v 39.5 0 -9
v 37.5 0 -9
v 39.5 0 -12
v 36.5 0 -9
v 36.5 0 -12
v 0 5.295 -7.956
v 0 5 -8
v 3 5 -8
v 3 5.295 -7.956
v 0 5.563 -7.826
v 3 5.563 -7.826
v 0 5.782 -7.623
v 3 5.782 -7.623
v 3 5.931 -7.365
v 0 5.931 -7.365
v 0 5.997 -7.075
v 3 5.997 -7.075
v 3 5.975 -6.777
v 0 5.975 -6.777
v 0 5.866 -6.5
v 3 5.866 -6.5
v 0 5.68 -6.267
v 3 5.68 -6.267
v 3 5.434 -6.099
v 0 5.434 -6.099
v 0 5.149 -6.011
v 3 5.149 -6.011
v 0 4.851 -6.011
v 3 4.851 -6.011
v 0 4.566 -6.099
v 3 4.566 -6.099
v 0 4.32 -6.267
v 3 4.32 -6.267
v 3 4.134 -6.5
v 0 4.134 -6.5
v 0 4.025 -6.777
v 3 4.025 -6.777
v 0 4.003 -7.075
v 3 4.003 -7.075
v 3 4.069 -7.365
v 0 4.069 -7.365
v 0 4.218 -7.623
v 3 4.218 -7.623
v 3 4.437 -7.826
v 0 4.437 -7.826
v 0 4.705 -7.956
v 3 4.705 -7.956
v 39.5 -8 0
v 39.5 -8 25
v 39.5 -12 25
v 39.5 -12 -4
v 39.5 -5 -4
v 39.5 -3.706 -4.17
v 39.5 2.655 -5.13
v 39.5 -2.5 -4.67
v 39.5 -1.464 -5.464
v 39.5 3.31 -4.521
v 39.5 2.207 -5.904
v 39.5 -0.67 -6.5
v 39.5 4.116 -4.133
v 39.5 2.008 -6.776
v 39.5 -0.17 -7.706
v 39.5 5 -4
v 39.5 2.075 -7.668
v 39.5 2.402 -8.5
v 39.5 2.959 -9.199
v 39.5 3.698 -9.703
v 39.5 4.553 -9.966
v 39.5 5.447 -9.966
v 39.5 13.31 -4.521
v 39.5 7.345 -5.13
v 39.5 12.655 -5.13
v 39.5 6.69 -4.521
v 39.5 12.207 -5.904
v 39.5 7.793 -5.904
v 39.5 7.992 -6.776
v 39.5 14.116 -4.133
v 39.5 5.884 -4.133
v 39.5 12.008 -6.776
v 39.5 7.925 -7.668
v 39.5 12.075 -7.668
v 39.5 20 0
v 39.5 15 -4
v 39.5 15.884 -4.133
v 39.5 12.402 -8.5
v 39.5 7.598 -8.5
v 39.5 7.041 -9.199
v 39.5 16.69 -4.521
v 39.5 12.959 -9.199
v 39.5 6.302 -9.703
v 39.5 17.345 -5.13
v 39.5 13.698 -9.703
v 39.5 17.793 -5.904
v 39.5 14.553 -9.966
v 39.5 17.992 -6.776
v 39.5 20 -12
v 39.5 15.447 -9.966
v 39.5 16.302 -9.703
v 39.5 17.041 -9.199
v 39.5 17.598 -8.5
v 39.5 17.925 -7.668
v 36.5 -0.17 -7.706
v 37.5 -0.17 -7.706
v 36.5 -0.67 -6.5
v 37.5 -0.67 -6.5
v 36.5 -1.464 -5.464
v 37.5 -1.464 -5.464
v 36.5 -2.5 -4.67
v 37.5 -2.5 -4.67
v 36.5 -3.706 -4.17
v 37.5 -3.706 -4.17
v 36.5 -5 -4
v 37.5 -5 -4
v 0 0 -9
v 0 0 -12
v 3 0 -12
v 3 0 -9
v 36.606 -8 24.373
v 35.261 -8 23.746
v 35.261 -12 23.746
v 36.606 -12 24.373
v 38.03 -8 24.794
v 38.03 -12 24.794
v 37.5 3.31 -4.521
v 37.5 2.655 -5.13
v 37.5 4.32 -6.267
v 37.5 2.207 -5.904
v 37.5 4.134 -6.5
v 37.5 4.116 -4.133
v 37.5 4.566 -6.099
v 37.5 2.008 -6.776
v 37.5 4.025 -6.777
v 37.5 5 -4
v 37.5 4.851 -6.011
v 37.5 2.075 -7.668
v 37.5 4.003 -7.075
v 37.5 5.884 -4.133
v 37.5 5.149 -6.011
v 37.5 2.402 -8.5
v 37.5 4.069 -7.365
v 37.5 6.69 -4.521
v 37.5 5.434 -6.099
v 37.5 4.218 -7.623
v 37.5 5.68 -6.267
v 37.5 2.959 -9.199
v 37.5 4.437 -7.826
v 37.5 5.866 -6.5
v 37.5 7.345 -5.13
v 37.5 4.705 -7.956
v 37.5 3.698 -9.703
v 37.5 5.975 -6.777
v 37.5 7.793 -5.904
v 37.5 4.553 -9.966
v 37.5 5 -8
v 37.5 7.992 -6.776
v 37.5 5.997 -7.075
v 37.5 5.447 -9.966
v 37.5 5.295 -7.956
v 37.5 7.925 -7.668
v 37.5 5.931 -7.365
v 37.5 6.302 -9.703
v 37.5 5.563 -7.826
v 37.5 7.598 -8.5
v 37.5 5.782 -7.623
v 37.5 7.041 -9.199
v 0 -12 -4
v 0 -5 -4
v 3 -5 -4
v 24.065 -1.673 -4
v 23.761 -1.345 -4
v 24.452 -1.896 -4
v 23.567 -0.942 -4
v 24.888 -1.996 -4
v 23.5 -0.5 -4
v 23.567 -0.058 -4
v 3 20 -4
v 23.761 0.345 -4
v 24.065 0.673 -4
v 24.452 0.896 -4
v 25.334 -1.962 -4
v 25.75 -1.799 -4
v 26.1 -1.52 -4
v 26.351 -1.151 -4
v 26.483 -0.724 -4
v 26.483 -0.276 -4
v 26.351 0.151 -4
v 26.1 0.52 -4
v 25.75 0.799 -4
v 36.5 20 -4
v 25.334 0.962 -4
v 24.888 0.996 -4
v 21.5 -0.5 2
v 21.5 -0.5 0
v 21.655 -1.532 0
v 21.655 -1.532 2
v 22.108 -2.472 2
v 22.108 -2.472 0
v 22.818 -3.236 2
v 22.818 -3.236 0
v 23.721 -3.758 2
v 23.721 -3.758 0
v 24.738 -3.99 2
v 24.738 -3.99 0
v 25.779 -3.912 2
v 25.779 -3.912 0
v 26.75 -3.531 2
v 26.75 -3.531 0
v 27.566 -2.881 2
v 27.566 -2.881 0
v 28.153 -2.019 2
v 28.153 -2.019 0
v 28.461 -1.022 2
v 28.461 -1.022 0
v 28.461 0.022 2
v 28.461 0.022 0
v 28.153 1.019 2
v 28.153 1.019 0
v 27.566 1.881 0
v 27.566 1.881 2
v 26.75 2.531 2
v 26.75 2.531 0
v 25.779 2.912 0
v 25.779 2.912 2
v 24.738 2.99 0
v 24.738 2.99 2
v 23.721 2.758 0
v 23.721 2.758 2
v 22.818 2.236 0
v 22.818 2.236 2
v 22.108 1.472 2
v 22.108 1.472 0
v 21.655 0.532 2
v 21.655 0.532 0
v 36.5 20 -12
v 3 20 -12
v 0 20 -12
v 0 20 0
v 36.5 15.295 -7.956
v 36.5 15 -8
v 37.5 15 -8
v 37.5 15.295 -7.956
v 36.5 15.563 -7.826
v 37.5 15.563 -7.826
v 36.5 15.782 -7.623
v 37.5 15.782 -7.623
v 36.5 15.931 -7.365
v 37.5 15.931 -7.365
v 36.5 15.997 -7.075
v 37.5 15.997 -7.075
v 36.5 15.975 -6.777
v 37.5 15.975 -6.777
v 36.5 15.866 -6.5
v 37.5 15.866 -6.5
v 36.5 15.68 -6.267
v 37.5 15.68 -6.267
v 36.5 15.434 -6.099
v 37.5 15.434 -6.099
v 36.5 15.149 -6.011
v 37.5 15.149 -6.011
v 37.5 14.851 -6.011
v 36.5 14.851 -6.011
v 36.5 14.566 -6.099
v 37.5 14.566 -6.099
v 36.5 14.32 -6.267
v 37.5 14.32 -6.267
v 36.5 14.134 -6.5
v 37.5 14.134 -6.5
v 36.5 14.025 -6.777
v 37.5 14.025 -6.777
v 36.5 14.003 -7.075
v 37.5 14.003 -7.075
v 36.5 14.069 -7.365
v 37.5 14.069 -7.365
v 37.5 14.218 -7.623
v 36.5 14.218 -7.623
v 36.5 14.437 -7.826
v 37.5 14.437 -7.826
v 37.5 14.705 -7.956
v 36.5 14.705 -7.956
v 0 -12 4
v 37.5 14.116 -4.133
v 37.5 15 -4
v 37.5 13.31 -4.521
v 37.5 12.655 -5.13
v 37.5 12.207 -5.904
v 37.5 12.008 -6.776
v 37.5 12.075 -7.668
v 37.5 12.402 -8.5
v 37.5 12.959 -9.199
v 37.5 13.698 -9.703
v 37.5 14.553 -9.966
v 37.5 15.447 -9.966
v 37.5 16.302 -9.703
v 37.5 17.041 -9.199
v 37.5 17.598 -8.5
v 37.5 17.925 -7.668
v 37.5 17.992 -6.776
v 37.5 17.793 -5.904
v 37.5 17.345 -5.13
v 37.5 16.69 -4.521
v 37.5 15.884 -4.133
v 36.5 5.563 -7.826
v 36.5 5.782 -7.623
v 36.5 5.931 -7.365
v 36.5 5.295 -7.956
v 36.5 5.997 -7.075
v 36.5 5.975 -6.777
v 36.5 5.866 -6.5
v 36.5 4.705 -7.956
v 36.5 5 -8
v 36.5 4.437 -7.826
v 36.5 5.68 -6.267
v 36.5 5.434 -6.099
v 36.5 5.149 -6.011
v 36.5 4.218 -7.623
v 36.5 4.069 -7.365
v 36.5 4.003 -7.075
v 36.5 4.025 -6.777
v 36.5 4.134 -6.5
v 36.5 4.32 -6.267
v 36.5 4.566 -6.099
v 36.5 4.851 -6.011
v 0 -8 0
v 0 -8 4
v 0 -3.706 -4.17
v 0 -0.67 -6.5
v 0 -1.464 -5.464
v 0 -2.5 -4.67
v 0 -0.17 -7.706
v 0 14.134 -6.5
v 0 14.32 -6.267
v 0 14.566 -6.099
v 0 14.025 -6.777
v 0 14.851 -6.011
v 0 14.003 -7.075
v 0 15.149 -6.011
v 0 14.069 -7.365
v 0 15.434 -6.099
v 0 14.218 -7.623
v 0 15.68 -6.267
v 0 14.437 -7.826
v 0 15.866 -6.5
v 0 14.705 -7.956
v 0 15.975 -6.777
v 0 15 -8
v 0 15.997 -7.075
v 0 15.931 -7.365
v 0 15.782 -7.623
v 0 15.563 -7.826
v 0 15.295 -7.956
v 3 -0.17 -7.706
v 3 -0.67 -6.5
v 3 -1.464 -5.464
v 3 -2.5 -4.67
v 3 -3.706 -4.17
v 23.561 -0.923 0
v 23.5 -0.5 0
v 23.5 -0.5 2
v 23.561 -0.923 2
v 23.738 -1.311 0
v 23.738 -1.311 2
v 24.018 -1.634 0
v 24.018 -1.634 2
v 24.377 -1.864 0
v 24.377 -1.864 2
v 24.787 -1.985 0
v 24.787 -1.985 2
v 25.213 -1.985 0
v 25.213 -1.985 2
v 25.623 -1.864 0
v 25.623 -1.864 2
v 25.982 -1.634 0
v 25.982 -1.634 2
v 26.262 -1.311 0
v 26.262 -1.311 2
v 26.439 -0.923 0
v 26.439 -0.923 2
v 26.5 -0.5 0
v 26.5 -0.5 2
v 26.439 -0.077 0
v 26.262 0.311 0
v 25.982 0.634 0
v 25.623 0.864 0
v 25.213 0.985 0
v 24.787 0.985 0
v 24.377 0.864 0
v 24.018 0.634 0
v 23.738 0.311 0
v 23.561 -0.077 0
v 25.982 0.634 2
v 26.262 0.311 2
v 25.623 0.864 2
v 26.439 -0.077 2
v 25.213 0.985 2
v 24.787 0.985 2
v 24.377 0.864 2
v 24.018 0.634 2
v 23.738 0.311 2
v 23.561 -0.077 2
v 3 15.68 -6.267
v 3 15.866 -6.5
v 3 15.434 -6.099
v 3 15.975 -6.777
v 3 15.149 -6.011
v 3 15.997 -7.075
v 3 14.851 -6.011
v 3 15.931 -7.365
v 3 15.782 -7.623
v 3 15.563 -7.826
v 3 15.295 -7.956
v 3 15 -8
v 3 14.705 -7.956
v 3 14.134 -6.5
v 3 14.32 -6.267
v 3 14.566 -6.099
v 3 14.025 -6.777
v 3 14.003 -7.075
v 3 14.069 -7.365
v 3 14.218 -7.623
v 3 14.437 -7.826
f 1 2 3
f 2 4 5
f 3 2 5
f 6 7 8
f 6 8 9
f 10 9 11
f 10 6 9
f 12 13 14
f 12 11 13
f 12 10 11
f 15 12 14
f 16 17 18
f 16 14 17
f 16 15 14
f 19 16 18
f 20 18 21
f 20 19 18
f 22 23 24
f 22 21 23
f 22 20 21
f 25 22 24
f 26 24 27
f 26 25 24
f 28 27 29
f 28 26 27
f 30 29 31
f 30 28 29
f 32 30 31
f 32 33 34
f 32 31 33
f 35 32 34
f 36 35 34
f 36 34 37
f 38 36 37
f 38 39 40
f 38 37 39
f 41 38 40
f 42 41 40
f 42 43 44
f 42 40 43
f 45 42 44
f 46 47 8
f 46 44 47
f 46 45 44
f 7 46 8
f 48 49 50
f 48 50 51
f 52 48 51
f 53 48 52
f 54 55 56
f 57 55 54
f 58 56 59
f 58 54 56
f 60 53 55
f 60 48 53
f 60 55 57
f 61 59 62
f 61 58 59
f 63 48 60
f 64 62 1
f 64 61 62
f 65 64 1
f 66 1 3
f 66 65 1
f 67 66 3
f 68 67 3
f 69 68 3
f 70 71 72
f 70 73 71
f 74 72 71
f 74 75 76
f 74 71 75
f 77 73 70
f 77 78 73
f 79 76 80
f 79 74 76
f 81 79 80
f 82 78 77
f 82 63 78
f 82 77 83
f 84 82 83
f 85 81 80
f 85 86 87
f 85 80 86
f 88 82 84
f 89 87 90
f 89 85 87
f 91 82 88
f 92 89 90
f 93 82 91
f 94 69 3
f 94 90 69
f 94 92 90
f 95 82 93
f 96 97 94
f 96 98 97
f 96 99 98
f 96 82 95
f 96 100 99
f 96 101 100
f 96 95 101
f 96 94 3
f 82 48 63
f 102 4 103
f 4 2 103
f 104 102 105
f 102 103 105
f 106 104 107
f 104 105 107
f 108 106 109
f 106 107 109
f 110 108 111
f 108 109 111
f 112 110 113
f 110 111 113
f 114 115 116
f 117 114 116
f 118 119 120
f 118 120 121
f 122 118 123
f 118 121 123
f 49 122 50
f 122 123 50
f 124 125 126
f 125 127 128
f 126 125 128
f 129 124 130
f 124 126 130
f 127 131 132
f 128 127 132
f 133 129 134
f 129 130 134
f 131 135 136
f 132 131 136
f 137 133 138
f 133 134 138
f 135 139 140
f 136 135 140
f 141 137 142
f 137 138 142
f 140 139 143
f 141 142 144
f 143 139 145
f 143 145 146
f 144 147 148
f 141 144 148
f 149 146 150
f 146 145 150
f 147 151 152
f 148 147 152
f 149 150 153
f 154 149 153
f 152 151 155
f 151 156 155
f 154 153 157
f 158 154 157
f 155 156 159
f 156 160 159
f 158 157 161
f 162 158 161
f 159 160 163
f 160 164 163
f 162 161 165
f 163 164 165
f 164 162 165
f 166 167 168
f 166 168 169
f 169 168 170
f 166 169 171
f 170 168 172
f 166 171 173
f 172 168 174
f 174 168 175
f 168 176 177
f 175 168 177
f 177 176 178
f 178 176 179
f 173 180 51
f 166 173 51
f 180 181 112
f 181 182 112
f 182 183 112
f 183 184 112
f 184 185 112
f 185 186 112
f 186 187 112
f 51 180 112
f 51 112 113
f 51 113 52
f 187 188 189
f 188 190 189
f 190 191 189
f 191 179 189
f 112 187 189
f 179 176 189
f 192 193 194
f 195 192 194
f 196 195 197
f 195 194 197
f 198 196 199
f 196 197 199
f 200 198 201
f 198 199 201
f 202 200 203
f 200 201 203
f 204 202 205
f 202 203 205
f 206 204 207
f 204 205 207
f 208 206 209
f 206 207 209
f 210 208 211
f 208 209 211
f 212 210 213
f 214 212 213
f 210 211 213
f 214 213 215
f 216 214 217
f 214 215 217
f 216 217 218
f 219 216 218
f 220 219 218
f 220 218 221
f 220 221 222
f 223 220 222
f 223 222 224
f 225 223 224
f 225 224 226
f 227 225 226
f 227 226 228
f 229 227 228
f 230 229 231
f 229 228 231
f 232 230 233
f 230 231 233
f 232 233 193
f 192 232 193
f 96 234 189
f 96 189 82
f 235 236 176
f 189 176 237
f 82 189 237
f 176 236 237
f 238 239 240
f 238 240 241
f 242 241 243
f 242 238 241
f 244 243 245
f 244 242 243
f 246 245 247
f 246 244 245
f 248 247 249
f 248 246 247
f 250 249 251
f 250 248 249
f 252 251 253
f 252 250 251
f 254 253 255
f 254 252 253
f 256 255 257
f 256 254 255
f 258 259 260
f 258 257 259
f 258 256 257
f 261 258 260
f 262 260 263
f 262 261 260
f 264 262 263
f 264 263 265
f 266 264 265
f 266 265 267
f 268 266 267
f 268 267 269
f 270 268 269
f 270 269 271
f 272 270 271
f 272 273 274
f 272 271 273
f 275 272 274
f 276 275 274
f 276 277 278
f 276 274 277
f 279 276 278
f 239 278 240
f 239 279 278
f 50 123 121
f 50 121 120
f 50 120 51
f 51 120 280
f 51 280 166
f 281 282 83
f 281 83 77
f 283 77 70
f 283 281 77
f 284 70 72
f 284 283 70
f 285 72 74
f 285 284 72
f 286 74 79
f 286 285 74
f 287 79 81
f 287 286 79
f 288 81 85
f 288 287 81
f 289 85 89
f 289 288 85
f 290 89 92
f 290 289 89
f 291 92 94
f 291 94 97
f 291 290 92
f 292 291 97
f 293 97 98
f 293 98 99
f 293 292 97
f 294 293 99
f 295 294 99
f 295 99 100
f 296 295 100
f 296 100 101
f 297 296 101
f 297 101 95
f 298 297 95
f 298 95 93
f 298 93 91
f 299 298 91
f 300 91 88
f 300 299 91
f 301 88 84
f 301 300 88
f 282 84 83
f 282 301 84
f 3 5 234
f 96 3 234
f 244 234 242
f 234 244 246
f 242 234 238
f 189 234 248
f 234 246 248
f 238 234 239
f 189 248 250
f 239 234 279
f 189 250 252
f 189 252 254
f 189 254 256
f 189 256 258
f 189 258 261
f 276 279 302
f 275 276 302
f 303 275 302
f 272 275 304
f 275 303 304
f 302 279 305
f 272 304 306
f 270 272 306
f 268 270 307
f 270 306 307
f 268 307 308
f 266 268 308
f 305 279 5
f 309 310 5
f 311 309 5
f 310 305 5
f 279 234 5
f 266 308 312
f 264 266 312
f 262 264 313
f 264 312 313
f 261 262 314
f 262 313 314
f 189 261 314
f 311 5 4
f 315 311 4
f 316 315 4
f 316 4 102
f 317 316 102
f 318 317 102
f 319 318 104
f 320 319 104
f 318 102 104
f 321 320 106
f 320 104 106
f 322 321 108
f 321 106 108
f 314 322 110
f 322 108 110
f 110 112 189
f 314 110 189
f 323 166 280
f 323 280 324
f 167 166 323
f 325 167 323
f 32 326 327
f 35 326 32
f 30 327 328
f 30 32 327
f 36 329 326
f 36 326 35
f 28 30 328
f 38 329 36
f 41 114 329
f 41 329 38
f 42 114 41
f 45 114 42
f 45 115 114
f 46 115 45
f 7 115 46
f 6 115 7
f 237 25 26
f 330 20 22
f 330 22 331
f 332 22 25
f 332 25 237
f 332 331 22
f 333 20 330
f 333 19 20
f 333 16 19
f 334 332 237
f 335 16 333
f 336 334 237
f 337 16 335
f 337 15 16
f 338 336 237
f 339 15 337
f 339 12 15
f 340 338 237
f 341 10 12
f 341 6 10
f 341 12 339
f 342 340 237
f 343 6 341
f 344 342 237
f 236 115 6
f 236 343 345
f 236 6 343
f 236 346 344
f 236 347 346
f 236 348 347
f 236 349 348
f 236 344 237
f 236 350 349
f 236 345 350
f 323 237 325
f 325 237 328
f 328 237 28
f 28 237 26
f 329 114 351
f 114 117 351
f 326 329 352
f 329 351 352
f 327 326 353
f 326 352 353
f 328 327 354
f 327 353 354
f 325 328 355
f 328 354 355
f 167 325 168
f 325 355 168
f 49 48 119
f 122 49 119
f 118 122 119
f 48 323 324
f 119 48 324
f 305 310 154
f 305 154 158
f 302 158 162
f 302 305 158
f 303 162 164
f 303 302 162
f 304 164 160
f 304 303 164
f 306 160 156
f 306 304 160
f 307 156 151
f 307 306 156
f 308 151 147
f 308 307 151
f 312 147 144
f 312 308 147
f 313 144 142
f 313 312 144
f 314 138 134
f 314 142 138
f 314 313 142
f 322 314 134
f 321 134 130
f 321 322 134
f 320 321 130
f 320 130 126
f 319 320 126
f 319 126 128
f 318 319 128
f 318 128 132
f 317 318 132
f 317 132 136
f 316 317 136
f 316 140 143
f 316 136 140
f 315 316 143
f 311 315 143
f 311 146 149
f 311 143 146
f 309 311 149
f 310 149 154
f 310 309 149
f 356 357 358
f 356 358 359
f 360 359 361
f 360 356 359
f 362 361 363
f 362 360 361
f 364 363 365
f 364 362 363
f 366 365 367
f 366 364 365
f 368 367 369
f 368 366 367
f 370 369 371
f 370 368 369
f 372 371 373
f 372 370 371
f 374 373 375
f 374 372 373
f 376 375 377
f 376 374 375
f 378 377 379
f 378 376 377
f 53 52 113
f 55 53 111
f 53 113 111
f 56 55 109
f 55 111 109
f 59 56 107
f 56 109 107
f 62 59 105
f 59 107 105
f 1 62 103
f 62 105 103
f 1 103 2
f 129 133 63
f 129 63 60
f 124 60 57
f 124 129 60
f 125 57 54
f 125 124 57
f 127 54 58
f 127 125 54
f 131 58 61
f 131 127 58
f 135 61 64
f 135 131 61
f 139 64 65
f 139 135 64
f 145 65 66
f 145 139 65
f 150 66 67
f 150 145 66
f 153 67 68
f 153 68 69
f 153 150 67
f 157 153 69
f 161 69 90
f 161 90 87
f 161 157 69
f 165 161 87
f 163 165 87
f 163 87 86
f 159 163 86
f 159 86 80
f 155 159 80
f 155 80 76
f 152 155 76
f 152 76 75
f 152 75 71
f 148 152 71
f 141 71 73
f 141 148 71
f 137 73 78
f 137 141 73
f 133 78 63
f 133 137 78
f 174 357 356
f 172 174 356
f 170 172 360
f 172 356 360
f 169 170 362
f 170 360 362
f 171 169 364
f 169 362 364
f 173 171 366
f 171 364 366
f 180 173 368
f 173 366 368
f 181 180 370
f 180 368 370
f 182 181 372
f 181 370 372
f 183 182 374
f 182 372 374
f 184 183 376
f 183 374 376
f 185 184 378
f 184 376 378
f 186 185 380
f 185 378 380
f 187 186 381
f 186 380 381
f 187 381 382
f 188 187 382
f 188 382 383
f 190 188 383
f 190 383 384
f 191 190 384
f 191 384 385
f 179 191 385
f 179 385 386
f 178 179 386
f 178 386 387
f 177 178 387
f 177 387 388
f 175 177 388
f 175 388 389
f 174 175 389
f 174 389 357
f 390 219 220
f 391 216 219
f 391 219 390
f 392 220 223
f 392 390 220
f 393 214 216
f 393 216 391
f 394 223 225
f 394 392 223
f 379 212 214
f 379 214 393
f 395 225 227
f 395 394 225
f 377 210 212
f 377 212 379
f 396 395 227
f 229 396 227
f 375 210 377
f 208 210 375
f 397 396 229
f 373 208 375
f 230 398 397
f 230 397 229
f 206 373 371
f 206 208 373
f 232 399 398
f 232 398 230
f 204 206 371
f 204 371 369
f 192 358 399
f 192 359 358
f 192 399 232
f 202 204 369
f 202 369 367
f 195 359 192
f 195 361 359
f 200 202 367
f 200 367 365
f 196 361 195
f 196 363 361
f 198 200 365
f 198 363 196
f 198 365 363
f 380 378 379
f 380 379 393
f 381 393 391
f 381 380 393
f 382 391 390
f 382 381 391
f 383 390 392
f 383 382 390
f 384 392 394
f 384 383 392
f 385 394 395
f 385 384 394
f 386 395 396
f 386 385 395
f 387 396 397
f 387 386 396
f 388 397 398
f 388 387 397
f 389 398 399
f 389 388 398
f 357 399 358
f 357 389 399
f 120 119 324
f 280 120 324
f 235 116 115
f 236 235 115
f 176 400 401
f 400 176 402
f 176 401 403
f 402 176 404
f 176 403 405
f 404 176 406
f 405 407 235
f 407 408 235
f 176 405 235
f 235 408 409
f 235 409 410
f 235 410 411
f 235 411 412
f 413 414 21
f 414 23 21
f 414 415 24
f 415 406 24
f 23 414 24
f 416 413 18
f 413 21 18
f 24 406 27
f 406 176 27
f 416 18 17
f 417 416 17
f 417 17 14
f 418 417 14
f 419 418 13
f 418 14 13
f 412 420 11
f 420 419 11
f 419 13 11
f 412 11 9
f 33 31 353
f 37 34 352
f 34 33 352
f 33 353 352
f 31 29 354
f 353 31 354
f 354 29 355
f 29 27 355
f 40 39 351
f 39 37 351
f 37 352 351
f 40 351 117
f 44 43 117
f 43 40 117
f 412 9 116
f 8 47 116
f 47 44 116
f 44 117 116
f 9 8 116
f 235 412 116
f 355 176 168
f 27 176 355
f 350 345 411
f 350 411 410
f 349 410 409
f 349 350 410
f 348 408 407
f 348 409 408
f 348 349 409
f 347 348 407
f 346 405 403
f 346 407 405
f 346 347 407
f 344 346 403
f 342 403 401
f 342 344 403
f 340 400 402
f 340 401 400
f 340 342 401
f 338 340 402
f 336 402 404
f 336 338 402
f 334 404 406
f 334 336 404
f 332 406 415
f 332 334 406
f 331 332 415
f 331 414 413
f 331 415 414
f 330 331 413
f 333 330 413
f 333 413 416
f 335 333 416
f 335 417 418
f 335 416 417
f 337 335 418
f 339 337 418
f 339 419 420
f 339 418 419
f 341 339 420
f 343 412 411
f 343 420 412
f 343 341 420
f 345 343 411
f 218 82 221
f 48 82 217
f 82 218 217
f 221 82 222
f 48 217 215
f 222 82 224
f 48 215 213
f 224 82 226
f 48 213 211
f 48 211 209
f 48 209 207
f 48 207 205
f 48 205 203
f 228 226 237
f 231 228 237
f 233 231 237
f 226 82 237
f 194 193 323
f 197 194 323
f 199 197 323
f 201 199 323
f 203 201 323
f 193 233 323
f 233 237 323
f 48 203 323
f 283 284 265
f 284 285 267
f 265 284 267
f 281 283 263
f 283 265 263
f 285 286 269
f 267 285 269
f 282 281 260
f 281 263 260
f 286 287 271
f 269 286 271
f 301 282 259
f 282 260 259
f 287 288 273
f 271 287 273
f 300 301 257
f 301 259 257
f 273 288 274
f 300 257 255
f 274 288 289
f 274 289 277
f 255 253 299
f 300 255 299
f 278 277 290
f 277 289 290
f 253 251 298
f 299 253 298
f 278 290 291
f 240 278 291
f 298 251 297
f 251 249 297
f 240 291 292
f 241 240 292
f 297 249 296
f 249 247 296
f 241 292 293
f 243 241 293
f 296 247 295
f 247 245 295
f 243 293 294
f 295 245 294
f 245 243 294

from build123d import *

# Parameters (mm, degrees)
BOSS_EXTRUDE1_DEPTH     = 20
SKETCH2_W               = 37.5
SKETCH2_H               = 4
BOSS_EXTRUDE2_DEPTH     = 12
FILLET1_R               = 5
SKETCH3_W               = 37.5
SKETCH3_H               = 4
BOSS_EXTRUDE3_DEPTH     = 25
SKETCH4_R               = 3.5
SKETCH4_R_2             = 1.5
BOSS_EXTRUDE4_DEPTH     = 2
SKETCH5_R               = 1.5
CUT_EXTRUDE1_DEPTH      = 49.324424466
CUT_EXTRUDE2_DEPTH      = 10
CUT_EXTRUDE3_DEPTH      = 50.307707308
CUT_EXTRUDE3_DEPTH_BACK = 50.307707308
SKETCH8_R               = 1
SKETCH9_R               = 3
BOSS_EXTRUDE5_DEPTH     = 2
FILLET2_R               = 10


with BuildPart() as part:
    # Sketch1 → Boss-Extrude1 (new body)
    with BuildSketch(Plane(origin=(0, 0, 0), x_dir=(1, 0, 0), z_dir=(0, 1, 0))):
        Polygon((0, 12), (0, 0), (37.5, 0), (37.5, 12), (36.5, 12), (36.5, 4), (3, 4), (3, 12), align=None)
    extrude(amount=BOSS_EXTRUDE1_DEPTH)

    # Sketch2 → Boss-Extrude2 (add)
    with BuildSketch(Plane.XZ):
        with Locations((18.75, -2)):
            Rectangle(SKETCH2_W, SKETCH2_H)
    extrude(amount=BOSS_EXTRUDE2_DEPTH)

    # Fillet1
    fillet1_edges = [part.edges().sort_by_distance(p)[0] for p in [
        (37, 0, -4),
        (1.5, 0, -4),
    ]]
    fillet(fillet1_edges, radius=FILLET1_R)

    # Sketch3 → Boss-Extrude3 (add)
    with BuildSketch(Plane.XY):
        with Locations((18.75, -10)):
            Rectangle(SKETCH3_W, SKETCH3_H)
    extrude(amount=BOSS_EXTRUDE3_DEPTH)

    # Sketch4 → Boss-Extrude4 (add)
    with BuildSketch(Plane.XY):
        with Locations(Location((25, -0.5, 0), (0, 0, 180))):
            Circle(SKETCH4_R)
        with Locations((25, -0.5)):
            Circle(SKETCH4_R_2, mode=Mode.SUBTRACT)
    extrude(amount=BOSS_EXTRUDE4_DEPTH)

    # Sketch5 → Cut-Extrude1 (cut, through all)
    with BuildSketch(Plane.XY.offset(2)):
        with Locations(Location((25, -0.5, 0), (0, 0, 180))):
            Circle(SKETCH5_R)
    extrude(amount=-CUT_EXTRUDE1_DEPTH, mode=Mode.SUBTRACT)

    # Sketch6 → Cut-Extrude2 (cut)
    with BuildSketch(Plane(origin=(0, -8, 0), x_dir=(1, 0, 0), z_dir=(0, 1, 0))):
        Polygon((37.5, -25), (0, -4), (0, -25), align=None)
    extrude(amount=-CUT_EXTRUDE2_DEPTH, mode=Mode.SUBTRACT)

    # Sketch8 → Cut-Extrude3 (cut, two sides: drawn at the far end of the back side and taken through both)
    with BuildSketch(Plane(origin=(37.5, 0, 0), x_dir=(0, 0, -1), z_dir=(1, 0, 0)).offset(-CUT_EXTRUDE3_DEPTH_BACK)):
        with Locations((7, 15)):
            Circle(SKETCH8_R)
        with Locations((7, 5)):
            Circle(SKETCH8_R)
    extrude(amount=CUT_EXTRUDE3_DEPTH + CUT_EXTRUDE3_DEPTH_BACK, mode=Mode.SUBTRACT)

    # Sketch9 → Boss-Extrude5 (add)
    with BuildSketch(Plane(origin=(37.5, 0, 0), x_dir=(0, 0, -1), z_dir=(1, 0, 0))):
        with BuildLine():
            Line((12, 20), (0, 20))
            Line((0, 20), (0, -8))
            Line((0, -8), (-25, -8))
            Line((-25, -8), (-25, -12))
            Line((-25, -12), (4, -12))
            Line((4, -12), (4, -5))
            ThreePointArc((4, -5), (5.464466094, -1.464466094), (9, 0))
            Line((9, 0), (12, 0))
            Line((12, 0), (12, 20))
        make_face()
        with Locations(Location((7, 5, 0), (0, 0, 180))):
            Circle(SKETCH9_R, mode=Mode.SUBTRACT)
        with Locations(Location((7, 15, 0), (0, 0, 180))):
            Circle(SKETCH9_R, mode=Mode.SUBTRACT)
    extrude(amount=BOSS_EXTRUDE5_DEPTH)

    # Fillet2
    # the kernel refuses this fillet: 10 mm, written as the material it takes off along each edge
    with BuildSketch(Plane(origin=(37.5, -18.416269062, 25), x_dir=(1, 0, 0), z_dir=(0, 1, 0))) as fillet2_piece_1:
        with BuildLine():
            CenterArc((2.646740347, 9.979064431), FILLET2_R, 240.751173663, 25.540689012)
            Line((-2.239293342, 1.254004272), (-2.337014016, 1.079503069))
            Line((-2.337014016, 1.079503069), (-0.097720674, -0.174501203))
            Line((-0.097720674, -0.174501203), (0, -0.2))
            ThreePointArc((0, -0.2), (1, -0.2), (1.987065193, -0.199581289))
            Line((1.987065193, -0.199581289), (2, 0))
        make_face()
    extrude(amount=16.832538123, mode=Mode.SUBTRACT)


solid = part.part
